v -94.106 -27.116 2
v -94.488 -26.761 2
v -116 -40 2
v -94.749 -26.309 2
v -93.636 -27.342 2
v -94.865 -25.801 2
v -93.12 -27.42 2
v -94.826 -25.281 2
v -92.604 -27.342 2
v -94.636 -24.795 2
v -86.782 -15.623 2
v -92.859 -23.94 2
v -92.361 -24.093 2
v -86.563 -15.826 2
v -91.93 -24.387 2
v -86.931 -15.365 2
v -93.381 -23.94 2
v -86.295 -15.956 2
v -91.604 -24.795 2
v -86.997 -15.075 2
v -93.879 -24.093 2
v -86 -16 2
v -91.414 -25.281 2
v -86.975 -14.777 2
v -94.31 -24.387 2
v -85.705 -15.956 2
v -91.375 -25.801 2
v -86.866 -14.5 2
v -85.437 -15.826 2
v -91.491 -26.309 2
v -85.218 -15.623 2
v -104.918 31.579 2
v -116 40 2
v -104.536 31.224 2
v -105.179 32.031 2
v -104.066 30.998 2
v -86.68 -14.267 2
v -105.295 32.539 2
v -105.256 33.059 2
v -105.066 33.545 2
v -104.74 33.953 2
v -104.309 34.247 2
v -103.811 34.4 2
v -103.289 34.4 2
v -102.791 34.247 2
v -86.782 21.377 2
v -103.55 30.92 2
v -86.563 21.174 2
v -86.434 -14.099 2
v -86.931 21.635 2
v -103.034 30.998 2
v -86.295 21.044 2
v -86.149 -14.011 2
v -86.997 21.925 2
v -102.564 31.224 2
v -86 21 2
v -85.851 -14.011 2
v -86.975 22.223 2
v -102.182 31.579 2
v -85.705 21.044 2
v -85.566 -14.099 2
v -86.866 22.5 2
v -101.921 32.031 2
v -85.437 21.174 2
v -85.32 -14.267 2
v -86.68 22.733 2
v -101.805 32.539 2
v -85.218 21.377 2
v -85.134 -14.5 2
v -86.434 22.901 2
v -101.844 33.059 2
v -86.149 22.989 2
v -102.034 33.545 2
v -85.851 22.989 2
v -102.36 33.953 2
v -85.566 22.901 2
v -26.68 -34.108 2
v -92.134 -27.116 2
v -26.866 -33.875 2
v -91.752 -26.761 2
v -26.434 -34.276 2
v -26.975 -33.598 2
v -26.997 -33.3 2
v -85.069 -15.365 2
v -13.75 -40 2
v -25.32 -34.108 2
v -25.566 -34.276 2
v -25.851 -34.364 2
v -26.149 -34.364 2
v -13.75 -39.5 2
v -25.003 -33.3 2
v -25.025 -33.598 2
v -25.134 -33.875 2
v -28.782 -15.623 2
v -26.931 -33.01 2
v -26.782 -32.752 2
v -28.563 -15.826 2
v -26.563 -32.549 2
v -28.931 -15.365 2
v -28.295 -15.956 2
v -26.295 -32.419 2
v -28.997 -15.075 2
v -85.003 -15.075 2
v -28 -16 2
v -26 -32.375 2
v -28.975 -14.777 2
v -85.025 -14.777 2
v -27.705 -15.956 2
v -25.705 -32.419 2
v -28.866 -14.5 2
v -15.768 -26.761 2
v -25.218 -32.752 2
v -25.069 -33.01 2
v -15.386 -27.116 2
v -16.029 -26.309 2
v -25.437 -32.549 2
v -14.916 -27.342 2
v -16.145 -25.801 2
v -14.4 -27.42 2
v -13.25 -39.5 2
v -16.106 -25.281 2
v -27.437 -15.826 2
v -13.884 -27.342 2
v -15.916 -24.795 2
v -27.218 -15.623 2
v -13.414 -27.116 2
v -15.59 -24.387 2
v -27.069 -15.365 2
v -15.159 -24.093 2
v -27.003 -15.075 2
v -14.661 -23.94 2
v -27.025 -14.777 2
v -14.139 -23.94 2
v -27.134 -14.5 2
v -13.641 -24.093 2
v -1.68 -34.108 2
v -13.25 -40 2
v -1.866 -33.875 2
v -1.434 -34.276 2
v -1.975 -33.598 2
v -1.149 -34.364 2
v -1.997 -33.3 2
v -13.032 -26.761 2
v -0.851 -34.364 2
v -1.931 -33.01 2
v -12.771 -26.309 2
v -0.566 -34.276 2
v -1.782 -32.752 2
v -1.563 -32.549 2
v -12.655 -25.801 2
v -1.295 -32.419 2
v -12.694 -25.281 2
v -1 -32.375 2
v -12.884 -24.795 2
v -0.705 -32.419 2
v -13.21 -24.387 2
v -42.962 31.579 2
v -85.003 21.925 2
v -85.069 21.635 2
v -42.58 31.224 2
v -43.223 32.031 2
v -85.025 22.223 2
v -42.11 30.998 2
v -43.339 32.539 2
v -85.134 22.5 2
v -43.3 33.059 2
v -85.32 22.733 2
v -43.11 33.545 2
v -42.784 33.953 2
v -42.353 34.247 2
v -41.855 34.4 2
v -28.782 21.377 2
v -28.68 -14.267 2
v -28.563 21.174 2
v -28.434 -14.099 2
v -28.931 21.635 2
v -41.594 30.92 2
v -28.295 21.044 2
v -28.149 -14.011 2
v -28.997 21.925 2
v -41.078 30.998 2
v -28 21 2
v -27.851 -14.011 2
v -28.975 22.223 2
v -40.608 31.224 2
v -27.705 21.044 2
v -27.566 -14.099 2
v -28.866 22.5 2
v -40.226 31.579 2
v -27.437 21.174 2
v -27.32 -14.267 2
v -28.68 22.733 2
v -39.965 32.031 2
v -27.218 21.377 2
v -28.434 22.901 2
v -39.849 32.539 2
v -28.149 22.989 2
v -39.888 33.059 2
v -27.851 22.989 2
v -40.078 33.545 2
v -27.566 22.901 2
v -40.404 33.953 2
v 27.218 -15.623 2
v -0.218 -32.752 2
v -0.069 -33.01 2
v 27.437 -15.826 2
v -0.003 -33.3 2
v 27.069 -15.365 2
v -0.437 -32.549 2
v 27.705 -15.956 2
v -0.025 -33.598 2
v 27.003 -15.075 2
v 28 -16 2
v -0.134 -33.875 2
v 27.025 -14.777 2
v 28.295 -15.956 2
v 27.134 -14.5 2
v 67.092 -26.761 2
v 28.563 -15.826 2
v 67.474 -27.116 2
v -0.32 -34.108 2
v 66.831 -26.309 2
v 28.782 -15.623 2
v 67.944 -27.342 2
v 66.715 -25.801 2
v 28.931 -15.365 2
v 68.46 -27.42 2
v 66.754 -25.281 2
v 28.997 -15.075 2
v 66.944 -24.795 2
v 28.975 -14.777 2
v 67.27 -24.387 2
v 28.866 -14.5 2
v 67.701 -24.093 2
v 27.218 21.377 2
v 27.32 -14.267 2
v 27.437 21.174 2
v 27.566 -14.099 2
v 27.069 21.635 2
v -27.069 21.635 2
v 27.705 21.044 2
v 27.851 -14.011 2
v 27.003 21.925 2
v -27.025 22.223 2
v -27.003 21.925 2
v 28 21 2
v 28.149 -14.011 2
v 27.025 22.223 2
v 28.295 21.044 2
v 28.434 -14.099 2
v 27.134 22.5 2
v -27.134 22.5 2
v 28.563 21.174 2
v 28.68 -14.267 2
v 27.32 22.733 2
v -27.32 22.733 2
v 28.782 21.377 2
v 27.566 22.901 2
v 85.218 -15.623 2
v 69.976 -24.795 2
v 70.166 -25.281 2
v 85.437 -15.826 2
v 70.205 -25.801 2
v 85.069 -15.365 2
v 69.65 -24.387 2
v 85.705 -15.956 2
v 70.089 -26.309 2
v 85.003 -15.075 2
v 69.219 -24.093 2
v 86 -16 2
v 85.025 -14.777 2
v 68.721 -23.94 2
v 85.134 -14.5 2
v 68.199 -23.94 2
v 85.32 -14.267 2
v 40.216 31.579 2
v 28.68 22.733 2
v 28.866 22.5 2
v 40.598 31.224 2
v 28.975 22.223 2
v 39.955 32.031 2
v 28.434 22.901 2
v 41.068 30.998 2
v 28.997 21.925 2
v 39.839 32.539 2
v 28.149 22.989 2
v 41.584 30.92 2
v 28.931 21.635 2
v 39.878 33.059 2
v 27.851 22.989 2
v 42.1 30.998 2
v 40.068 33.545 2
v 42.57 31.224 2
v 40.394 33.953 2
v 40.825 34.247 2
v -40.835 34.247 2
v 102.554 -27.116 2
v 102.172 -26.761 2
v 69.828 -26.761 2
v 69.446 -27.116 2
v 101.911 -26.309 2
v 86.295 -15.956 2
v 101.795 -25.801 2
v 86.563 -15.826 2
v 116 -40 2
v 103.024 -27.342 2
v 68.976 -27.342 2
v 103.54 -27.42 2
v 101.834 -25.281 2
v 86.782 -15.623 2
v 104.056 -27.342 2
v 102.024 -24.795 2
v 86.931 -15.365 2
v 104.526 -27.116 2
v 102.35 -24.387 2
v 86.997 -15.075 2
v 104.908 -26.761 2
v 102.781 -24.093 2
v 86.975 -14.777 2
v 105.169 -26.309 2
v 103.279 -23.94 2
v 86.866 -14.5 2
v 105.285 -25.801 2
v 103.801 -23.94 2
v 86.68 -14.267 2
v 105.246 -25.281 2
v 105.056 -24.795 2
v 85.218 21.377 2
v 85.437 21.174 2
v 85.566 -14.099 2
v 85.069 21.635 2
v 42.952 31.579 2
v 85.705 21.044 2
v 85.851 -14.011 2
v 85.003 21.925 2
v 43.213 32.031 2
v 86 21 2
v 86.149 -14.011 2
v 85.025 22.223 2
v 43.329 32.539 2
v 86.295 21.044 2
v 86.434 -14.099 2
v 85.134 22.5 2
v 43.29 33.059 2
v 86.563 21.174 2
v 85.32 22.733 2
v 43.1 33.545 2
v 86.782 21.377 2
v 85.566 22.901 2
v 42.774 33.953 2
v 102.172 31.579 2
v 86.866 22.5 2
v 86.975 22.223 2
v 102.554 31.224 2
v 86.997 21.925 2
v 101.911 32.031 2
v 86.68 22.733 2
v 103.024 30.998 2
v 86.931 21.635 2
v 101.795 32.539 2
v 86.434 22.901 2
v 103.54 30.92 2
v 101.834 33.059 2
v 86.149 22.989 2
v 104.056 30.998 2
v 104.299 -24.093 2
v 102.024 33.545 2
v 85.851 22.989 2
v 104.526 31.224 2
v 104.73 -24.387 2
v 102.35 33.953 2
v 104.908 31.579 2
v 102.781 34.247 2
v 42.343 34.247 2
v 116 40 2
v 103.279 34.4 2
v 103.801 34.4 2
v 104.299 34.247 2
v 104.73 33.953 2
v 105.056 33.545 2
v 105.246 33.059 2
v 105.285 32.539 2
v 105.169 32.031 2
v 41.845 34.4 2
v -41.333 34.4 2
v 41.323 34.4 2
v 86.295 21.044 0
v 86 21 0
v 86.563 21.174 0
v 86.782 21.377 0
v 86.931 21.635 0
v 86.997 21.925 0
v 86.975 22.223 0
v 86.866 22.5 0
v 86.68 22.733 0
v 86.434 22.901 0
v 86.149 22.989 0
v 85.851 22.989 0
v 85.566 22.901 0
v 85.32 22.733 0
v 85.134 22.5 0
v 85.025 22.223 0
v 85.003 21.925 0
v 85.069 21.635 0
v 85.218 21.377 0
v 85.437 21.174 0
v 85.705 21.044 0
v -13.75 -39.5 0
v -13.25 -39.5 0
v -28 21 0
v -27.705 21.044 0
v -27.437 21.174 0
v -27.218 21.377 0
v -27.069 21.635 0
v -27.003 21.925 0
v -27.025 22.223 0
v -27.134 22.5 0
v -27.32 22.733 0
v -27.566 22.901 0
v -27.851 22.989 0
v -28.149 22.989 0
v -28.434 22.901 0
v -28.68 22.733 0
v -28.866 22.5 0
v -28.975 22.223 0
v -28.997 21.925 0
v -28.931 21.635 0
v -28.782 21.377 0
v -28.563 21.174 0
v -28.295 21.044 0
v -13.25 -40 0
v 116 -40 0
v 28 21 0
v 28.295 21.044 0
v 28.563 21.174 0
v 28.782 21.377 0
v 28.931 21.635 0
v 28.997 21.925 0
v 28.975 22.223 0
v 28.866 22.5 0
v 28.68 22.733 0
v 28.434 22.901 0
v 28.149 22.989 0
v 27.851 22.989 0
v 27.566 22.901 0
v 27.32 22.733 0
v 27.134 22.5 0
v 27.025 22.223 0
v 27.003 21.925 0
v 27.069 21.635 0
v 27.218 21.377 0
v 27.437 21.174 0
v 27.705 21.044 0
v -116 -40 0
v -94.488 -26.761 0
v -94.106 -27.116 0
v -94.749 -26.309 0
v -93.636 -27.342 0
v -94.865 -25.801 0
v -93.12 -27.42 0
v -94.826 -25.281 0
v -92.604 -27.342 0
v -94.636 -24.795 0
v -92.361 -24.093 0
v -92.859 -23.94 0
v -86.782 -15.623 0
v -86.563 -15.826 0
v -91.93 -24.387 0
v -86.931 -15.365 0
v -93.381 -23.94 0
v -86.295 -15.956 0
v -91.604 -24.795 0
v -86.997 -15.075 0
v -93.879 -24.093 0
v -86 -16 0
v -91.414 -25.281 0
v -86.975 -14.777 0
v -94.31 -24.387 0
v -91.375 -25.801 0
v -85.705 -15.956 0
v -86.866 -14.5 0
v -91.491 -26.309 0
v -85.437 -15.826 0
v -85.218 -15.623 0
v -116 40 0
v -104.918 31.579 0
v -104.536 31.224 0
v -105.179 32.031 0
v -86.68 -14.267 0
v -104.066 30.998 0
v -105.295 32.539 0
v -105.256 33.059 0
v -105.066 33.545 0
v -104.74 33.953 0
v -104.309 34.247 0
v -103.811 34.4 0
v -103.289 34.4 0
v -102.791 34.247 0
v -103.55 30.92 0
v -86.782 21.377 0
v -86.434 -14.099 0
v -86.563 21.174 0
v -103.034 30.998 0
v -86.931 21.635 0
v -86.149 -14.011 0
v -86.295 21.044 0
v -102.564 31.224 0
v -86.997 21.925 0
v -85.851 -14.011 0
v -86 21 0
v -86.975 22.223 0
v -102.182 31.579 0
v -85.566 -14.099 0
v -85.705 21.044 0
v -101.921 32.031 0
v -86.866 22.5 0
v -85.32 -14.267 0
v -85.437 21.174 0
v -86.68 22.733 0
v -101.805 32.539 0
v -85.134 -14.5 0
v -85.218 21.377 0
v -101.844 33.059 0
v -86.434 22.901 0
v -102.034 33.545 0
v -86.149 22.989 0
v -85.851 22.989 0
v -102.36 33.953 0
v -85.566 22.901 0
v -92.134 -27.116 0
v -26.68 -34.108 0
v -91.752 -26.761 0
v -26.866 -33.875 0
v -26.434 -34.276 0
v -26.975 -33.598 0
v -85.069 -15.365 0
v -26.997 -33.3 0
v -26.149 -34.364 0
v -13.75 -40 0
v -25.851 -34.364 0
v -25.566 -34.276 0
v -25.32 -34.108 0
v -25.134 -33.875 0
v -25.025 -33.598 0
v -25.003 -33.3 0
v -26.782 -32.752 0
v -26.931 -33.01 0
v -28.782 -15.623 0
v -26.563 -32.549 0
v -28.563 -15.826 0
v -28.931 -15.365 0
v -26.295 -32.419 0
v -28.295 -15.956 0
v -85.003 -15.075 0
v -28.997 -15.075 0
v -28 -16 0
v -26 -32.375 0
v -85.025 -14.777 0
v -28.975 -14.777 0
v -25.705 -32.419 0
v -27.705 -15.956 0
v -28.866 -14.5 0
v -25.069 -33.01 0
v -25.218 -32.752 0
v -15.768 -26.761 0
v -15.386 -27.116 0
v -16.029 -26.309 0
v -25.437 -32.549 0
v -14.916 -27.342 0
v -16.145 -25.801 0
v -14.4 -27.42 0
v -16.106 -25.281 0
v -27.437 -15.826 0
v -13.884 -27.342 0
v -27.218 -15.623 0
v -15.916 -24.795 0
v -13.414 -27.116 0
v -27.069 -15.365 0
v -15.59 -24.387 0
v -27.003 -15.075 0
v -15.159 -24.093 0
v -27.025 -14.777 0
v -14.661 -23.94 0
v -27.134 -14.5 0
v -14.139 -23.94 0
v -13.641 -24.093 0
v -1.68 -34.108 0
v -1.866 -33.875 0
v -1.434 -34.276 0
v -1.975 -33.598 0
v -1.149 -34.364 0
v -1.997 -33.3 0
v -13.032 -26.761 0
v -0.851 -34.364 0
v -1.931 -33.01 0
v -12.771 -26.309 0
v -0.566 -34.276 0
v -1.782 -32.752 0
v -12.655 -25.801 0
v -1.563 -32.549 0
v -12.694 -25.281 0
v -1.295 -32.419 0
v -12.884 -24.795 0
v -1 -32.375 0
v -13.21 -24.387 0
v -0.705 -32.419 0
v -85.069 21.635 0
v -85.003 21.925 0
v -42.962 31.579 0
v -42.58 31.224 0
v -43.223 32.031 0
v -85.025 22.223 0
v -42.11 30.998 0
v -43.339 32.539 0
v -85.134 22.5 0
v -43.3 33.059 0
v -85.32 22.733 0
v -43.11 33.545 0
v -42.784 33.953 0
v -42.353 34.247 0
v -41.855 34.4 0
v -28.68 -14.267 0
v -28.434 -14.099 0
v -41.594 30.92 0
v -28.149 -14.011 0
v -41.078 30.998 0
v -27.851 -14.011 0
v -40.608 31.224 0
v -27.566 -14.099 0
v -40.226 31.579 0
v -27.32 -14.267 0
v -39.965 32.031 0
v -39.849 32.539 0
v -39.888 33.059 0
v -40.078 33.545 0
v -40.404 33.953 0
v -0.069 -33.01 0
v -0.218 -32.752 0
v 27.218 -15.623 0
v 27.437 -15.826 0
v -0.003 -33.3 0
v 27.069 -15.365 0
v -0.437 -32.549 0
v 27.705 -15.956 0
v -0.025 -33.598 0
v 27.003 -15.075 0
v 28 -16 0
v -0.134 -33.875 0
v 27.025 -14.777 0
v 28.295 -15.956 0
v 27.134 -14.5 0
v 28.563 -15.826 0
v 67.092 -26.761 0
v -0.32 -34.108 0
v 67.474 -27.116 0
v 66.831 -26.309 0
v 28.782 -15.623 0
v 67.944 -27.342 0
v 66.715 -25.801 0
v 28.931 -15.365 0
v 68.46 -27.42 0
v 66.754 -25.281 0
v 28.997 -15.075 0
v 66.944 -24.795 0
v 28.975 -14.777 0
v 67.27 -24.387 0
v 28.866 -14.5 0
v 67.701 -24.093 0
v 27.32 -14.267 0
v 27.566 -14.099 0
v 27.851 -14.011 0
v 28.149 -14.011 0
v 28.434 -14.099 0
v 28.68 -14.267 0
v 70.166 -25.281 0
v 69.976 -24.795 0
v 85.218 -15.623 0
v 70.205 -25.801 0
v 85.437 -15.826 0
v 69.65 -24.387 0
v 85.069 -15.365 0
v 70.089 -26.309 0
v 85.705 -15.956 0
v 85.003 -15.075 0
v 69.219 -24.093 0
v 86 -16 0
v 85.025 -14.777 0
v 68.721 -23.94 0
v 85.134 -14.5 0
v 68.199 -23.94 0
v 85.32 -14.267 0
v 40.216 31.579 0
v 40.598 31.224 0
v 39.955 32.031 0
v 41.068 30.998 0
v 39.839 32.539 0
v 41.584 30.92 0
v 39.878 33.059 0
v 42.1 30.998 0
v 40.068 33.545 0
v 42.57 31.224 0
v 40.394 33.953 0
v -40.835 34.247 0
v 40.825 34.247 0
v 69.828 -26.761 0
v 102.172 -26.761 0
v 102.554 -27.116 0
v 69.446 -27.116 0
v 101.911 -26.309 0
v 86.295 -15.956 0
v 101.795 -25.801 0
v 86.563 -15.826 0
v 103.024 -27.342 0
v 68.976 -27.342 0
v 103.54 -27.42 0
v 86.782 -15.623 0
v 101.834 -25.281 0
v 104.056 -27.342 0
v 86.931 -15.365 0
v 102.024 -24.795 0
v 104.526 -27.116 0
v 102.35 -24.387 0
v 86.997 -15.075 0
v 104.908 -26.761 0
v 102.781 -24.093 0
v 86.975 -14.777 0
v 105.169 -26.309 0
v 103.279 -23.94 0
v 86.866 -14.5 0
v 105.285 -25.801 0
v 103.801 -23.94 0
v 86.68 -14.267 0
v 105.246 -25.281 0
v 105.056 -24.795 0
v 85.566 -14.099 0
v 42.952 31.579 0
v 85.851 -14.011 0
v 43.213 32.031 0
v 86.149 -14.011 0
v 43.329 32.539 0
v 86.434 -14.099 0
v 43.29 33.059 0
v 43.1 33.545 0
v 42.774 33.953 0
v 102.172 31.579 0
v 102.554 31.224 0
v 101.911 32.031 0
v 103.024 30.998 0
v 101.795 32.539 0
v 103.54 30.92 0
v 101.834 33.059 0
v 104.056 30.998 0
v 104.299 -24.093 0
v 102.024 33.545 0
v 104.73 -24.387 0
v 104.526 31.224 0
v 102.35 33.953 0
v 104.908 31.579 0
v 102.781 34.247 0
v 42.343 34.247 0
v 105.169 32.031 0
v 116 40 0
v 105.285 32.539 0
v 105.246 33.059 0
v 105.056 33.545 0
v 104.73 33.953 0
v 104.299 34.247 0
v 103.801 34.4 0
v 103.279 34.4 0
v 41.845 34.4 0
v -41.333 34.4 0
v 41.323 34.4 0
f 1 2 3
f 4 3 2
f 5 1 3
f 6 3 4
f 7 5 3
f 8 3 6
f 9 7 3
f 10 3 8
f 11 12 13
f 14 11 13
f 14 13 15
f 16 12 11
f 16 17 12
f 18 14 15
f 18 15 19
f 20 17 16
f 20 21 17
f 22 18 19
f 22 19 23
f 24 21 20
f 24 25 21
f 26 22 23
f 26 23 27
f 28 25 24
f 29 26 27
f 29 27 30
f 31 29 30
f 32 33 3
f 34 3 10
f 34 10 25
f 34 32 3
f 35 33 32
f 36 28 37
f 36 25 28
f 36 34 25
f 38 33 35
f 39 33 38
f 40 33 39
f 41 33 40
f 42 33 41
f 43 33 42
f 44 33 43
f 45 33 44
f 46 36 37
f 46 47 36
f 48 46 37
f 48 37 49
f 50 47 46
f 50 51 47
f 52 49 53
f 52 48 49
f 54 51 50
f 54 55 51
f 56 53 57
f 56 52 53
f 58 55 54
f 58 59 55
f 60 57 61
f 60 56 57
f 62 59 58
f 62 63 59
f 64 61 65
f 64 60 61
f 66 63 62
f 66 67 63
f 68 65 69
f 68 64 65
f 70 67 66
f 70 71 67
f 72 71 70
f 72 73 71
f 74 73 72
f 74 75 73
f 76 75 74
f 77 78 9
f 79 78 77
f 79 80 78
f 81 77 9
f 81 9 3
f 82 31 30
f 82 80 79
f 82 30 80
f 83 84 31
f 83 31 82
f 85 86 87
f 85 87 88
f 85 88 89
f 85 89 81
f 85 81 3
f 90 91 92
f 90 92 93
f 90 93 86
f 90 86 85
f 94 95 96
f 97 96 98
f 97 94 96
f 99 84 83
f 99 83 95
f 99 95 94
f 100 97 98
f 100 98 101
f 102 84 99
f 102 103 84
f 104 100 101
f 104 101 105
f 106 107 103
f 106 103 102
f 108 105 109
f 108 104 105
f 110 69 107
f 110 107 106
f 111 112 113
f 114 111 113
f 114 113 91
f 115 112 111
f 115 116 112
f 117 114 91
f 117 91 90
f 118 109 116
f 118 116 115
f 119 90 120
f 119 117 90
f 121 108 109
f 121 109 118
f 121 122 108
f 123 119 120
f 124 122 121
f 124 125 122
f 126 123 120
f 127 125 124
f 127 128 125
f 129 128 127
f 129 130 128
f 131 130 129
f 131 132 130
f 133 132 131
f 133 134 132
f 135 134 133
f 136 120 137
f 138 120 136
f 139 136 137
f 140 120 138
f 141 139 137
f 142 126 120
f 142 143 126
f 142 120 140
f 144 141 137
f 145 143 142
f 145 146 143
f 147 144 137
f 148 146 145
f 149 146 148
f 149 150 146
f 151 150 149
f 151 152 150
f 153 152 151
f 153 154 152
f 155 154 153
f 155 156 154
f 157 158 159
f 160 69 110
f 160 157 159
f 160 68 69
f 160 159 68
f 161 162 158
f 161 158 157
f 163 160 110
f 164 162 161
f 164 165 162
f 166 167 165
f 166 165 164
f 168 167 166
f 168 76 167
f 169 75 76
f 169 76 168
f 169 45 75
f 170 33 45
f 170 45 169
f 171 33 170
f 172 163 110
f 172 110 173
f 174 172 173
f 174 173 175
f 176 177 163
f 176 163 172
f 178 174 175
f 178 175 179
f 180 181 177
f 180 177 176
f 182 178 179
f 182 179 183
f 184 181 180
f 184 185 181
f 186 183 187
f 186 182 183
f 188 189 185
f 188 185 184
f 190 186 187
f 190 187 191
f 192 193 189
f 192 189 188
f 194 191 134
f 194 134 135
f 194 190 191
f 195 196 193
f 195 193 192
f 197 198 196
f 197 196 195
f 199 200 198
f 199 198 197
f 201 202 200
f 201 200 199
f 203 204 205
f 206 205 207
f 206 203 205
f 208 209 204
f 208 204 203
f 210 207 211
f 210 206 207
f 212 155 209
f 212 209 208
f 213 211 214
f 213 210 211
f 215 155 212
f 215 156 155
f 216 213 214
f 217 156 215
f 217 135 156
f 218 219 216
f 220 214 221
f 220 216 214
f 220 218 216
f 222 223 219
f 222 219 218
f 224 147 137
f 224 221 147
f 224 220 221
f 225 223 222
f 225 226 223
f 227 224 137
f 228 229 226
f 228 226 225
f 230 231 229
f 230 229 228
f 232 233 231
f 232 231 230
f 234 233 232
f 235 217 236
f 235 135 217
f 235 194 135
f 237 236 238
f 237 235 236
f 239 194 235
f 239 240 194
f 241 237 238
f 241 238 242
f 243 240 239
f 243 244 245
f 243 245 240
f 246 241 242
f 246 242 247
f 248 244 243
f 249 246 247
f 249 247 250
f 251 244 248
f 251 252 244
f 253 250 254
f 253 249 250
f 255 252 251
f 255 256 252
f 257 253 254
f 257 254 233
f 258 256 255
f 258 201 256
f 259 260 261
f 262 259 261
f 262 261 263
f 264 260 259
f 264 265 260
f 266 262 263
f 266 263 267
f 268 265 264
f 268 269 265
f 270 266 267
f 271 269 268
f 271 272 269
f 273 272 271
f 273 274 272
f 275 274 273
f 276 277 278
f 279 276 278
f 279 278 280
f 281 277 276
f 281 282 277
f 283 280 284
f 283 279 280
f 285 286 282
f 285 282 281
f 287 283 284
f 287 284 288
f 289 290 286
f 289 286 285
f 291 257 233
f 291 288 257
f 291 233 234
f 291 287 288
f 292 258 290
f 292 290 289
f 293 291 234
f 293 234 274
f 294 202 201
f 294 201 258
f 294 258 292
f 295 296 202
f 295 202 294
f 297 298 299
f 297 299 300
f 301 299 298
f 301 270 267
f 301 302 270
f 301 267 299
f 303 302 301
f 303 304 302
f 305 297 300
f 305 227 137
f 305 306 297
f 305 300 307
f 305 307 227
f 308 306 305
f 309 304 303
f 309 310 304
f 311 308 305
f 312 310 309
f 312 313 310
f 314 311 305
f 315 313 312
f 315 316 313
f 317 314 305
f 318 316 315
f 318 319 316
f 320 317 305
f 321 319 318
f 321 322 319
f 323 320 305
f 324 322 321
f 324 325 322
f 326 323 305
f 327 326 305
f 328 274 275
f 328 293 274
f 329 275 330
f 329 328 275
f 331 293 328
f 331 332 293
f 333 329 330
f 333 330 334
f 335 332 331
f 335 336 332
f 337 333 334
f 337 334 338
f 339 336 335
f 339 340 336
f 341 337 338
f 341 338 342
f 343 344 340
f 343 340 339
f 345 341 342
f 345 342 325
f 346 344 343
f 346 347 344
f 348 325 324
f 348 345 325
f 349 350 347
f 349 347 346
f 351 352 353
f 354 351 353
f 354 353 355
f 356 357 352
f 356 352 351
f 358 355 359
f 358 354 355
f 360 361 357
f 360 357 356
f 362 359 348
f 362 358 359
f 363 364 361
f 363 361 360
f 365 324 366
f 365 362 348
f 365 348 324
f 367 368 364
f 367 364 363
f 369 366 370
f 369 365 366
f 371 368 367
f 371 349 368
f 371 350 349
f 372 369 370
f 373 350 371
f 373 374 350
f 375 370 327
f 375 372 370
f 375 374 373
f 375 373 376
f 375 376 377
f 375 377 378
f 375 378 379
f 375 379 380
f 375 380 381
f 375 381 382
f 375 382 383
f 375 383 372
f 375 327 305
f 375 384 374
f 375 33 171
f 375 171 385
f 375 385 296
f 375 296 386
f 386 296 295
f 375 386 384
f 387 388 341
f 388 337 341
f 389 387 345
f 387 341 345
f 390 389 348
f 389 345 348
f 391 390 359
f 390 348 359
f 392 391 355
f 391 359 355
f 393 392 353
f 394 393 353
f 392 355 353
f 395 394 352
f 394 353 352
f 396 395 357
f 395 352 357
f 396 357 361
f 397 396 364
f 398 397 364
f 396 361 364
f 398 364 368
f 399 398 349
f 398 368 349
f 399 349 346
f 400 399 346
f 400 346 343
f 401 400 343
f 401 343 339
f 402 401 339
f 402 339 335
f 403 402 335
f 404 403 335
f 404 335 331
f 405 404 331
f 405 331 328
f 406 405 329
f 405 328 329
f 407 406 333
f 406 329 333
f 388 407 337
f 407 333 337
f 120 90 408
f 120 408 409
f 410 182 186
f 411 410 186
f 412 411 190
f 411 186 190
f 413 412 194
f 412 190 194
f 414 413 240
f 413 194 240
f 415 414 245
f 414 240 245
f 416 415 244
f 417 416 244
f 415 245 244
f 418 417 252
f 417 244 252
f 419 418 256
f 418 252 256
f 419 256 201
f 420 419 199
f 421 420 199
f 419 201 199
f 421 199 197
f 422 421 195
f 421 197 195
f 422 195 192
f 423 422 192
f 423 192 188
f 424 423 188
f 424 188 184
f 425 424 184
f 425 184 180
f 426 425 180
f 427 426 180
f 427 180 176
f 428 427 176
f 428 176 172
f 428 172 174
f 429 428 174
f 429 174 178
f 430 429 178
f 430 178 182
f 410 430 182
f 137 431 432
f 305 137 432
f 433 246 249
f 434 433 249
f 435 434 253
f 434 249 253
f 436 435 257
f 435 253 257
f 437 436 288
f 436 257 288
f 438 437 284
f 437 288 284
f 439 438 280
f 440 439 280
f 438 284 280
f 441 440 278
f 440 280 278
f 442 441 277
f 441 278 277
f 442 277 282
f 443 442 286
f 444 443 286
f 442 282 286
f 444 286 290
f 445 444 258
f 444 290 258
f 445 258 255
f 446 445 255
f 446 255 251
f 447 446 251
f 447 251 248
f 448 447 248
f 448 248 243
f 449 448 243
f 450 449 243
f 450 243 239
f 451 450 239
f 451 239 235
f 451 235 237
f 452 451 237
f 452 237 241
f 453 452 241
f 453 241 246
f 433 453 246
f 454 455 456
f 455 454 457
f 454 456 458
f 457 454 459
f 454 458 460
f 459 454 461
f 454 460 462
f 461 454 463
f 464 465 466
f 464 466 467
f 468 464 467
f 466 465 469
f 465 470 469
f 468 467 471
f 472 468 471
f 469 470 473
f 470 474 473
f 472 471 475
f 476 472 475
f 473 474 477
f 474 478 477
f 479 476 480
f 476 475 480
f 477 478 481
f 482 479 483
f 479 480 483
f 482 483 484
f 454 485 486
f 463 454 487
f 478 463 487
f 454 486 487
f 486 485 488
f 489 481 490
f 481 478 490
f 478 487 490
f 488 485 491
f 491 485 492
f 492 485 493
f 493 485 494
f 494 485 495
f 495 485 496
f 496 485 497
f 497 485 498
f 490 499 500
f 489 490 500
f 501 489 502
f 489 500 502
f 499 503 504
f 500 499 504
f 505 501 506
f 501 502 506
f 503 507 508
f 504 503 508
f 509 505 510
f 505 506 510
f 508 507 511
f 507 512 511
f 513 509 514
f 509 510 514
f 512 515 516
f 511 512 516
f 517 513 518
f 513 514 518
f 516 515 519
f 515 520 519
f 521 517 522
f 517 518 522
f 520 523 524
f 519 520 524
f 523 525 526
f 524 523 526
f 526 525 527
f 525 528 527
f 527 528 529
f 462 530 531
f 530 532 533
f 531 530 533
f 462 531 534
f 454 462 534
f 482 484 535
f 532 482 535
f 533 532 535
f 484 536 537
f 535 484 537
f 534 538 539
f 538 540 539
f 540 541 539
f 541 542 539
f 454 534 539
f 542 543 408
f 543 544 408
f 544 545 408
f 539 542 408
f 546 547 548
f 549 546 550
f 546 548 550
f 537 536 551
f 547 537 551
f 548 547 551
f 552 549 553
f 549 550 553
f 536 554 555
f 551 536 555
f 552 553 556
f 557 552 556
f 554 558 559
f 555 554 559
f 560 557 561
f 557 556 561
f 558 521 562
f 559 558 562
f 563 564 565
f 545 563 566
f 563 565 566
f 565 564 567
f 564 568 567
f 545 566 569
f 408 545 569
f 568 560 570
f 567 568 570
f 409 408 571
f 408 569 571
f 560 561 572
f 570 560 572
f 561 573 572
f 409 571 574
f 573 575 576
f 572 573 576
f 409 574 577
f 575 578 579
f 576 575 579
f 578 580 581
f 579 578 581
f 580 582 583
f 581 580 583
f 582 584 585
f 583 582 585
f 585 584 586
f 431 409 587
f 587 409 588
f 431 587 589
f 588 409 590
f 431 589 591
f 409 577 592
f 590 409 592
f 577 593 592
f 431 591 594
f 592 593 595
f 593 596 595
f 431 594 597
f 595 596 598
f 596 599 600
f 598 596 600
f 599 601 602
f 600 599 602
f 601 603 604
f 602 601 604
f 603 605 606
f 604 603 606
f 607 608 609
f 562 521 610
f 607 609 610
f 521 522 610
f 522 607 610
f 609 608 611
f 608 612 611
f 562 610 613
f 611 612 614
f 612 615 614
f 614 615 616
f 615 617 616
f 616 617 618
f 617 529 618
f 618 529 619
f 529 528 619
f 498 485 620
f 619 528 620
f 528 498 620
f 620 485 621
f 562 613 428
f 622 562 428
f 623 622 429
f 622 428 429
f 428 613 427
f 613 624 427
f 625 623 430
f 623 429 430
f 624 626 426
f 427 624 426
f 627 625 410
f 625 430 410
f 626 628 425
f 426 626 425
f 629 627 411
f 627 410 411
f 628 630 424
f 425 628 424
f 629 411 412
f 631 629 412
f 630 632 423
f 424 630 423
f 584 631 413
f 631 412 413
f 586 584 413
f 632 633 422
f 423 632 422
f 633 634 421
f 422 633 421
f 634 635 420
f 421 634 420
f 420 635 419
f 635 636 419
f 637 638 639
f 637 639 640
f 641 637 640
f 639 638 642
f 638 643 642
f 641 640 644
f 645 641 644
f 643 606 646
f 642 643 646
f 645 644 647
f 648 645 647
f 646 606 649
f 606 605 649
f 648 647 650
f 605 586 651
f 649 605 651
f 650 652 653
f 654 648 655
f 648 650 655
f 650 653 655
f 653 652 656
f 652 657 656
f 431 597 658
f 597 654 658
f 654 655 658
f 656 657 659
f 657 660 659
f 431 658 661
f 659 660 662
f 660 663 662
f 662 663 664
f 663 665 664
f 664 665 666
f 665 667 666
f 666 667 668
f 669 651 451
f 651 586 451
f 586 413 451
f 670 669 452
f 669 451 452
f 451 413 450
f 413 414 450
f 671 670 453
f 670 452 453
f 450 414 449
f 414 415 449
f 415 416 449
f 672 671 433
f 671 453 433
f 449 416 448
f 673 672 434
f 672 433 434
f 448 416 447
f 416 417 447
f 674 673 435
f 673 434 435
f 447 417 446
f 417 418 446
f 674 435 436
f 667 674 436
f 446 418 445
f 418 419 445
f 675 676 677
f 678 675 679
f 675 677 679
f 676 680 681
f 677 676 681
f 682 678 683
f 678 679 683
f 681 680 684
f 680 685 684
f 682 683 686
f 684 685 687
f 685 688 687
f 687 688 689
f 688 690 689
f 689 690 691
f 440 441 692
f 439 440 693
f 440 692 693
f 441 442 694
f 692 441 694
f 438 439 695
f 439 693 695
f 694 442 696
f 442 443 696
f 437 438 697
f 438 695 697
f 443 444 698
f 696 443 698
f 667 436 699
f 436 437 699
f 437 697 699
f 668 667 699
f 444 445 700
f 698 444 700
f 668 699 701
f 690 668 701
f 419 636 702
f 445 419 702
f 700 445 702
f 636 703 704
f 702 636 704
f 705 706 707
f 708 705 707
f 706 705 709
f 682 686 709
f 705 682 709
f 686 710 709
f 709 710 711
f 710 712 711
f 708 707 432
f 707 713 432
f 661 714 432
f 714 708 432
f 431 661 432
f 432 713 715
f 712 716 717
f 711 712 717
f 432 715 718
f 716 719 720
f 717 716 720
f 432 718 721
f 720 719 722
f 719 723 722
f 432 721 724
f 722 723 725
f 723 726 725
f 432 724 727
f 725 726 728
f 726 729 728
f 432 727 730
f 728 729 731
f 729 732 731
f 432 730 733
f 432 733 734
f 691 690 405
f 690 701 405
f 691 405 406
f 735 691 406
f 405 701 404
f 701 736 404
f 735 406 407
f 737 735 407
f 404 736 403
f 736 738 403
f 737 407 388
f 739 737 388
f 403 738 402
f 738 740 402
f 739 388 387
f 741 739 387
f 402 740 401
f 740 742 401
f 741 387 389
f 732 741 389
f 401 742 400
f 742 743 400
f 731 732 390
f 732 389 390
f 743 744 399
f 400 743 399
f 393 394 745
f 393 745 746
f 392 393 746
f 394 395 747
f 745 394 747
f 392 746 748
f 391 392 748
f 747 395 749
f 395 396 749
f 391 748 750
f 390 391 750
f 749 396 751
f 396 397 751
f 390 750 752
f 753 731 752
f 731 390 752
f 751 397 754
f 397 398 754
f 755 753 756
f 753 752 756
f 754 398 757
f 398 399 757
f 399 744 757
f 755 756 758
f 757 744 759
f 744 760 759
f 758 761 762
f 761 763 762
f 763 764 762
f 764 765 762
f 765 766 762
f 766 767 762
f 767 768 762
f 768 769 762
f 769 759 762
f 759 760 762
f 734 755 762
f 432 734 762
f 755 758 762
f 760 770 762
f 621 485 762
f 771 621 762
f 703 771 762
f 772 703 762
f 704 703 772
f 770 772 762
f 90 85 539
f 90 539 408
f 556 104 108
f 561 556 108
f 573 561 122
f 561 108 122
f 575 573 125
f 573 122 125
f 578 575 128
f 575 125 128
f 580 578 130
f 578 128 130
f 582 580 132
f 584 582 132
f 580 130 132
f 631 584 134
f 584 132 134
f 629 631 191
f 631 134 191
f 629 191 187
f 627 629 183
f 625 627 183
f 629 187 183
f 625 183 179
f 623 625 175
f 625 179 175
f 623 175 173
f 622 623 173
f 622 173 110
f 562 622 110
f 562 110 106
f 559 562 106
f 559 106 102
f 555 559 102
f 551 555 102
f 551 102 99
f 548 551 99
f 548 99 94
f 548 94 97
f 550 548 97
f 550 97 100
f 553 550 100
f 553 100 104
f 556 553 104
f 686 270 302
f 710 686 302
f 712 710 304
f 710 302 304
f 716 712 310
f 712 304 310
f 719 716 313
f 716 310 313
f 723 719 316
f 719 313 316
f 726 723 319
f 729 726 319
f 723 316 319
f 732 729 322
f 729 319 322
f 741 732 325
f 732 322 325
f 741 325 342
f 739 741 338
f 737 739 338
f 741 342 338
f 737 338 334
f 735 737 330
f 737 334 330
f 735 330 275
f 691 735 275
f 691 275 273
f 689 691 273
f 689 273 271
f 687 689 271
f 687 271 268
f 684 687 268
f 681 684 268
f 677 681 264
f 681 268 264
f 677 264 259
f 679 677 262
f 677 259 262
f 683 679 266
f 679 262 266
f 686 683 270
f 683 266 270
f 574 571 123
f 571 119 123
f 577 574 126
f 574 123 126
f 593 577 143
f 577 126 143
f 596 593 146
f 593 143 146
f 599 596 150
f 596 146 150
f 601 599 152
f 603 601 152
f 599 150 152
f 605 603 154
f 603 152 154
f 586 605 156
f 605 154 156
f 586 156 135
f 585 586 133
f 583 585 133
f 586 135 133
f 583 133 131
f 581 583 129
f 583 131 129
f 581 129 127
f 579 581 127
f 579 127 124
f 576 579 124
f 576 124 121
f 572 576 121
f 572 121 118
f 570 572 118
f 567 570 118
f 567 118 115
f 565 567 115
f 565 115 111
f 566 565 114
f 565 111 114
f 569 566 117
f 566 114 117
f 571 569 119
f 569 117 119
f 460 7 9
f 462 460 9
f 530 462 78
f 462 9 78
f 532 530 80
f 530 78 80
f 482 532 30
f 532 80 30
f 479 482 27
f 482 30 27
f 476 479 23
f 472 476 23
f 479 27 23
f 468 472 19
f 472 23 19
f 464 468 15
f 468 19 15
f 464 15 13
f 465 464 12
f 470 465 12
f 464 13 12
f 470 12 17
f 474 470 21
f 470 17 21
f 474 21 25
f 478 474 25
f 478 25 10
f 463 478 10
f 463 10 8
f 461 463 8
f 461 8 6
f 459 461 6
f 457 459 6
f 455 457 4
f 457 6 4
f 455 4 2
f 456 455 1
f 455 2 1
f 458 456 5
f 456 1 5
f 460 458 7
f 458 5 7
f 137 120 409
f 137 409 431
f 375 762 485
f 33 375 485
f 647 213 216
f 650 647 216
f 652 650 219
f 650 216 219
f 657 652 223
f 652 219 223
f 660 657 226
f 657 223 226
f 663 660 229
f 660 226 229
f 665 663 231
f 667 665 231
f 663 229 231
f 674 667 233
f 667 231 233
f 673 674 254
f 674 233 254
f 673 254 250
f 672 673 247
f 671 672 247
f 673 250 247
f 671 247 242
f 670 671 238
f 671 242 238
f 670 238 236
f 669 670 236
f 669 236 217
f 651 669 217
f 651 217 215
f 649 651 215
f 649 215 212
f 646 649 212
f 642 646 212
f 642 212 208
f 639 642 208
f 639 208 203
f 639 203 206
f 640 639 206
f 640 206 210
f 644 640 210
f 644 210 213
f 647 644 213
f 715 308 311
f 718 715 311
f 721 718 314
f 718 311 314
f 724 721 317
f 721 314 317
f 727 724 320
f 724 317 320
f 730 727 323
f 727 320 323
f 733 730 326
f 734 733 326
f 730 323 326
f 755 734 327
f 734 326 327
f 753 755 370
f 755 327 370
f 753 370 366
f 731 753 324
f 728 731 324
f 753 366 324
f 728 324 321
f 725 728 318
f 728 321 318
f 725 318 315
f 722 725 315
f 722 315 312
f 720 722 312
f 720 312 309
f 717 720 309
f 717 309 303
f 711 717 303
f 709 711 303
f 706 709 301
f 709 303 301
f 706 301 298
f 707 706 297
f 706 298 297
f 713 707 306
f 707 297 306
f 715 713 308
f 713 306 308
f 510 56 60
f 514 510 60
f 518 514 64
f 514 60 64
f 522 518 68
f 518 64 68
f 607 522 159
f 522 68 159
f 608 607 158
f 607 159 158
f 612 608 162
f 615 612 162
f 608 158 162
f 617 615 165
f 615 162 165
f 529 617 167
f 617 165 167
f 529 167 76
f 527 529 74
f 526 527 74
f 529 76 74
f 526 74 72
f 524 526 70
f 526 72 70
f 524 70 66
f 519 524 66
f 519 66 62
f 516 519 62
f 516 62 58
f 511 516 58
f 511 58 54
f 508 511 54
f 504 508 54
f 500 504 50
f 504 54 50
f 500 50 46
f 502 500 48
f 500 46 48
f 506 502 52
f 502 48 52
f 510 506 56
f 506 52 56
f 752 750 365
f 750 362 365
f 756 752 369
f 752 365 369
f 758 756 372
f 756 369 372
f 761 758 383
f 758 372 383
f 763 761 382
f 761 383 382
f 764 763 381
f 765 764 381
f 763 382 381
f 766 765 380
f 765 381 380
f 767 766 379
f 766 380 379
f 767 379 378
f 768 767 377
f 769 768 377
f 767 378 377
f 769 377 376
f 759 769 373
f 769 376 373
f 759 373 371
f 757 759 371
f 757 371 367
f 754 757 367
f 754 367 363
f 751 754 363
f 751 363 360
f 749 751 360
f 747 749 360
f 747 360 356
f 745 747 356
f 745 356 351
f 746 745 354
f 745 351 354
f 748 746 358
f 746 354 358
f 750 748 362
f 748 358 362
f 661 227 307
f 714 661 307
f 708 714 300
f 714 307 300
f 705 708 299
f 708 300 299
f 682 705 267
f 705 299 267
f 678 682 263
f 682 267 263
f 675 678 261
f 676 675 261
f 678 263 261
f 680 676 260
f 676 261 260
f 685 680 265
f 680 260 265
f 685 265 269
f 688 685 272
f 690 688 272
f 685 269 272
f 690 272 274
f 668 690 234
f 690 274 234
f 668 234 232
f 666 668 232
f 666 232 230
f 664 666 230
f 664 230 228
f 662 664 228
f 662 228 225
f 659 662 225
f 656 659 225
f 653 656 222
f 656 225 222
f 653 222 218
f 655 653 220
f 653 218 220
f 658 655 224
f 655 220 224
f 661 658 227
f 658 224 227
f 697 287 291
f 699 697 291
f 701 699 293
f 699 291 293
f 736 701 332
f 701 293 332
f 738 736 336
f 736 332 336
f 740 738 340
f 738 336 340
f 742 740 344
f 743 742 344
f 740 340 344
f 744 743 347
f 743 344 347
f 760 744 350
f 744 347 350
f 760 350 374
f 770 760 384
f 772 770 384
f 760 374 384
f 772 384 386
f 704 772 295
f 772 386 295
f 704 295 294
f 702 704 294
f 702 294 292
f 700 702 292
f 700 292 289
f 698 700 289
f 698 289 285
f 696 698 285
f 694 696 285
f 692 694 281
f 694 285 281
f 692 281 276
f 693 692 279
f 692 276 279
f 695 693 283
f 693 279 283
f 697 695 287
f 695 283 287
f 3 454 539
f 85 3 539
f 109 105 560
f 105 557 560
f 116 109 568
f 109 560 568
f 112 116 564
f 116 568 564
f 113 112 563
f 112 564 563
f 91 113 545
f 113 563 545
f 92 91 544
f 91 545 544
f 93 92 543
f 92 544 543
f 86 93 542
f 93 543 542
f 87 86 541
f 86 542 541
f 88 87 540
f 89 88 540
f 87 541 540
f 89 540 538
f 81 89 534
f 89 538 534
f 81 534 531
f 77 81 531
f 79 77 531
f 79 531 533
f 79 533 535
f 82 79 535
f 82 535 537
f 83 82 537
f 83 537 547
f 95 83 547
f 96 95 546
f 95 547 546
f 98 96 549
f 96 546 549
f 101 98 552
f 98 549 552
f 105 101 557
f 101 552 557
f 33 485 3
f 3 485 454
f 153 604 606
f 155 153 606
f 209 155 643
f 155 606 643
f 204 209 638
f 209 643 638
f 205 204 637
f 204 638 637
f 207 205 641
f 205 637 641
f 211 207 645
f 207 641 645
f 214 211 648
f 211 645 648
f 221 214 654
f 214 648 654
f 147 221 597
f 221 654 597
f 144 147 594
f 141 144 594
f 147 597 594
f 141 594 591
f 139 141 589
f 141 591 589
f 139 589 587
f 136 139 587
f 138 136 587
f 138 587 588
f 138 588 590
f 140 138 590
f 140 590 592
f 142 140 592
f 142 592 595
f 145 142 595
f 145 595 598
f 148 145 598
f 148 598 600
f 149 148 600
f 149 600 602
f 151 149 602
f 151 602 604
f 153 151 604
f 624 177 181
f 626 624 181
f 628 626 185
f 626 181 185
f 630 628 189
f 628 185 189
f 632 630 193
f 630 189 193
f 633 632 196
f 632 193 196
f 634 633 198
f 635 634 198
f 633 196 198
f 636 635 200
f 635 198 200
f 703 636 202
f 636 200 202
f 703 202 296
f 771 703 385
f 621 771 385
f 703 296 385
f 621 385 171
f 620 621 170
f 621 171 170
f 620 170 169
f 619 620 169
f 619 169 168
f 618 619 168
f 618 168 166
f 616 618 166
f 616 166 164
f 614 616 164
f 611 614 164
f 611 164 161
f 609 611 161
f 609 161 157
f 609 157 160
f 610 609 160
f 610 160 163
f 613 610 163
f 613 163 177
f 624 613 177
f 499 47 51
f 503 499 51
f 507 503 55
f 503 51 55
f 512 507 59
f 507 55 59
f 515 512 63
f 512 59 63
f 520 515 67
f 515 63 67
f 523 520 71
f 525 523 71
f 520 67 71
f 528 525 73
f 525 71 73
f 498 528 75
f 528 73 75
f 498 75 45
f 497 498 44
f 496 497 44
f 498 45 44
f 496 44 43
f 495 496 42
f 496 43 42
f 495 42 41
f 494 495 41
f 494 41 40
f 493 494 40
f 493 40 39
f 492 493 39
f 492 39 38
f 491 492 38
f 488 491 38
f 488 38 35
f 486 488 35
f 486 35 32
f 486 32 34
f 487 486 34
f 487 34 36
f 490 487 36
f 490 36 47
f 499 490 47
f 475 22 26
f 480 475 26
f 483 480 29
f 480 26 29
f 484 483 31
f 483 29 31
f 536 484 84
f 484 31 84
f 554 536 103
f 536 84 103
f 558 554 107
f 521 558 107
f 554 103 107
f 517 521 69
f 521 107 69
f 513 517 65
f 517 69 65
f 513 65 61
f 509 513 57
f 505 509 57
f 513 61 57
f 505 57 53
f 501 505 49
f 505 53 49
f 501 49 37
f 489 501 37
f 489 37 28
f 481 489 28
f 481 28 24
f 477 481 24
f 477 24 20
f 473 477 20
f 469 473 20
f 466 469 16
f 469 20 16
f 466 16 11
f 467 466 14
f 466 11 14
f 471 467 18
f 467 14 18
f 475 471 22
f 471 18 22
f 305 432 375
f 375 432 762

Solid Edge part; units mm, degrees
sketch "Sketch1" plane through (0, 0, 0) normal (0, 0, 1) x (1, 0, 0)
  line L0 (-116, -40) -> (116, -40)
  line L1 (116, -40) -> (116, 40)
  line L2 (116, 40) -> (-116, 40)
  line L3 (-116, 40) -> (-116, -40)
  dimension "D1" = 80
  dimension "D2" = 232
extrude "Protrusion1" add sketch "Sketch1" along normal blind 2
hole "Hole1" at (-26, -33.375, 0) direction (0, 0, 1) diameter 2 end up to next
hole "Hole2" at (-1, -33.375, 0) direction (0, 0, 1) diameter 2 end up to next
hole "Hole3" at (-28, 22, 2) direction (0, 0, -1) diameter 2 end through all
hole "Hole4" at (28, 22, 2) direction (0, 0, -1) diameter 2 end through all
hole "Hole5" at (86, 22, 2) direction (0, 0, -1) diameter 2 end through all
hole "Hole6" at (86, -15, 2) direction (0, 0, -1) diameter 2 end through all
hole "Hole7" at (28, -15, 2) direction (0, 0, -1) diameter 2 end through all
hole "Hole8" at (-28, -15, 2) direction (0, 0, -1) diameter 2 end through all
hole "Hole9" at (-86, -15, 2) direction (0, 0, -1) diameter 2 end through all
hole "Hole10" at (-86, 22, 2) direction (0, 0, -1) diameter 2 end through all
sketch "Sketch2" plane through (0, 0, 2) normal (0, 0, 1) x (1, 0, 0)
  line L0 (-13.75, -40) -> (-13.25, -40)
  line L1 (-13.25, -39.5) -> (-13.25, -40)
  line L2 (-13.75, -39.5) -> (-13.25, -39.5)
  line L3 (-13.75, -40) -> (-13.75, -39.5)
  dimension "D1" = 0.5
extrude "Cutout1" cut sketch "Sketch2" against normal through all
hole "Hole11" at (-14.4, -25.67, 2) direction (0, 0, -1) diameter 3.5 end through all
hole "Hole12" at (-103.55, 32.67, 2) direction (0, 0, -1) diameter 3.5 end through all
hole "Hole13" at (103.54, -25.67, 2) direction (0, 0, -1) diameter 3.5 end through all
hole "Hole14" at (68.46, -25.67, 2) direction (0, 0, -1) diameter 3.5 end through all
hole "Hole15" at (103.54, 32.67, 2) direction (0, 0, -1) diameter 3.5 end through all
hole "Hole16" at (-41.594, 32.67, 2) direction (0, 0, -1) diameter 3.5 end through all
hole "Hole17" at (41.584, 32.67, 2) direction (0, 0, -1) diameter 3.5 end through all
hole "Hole18" at (-93.12, -25.67, 2) direction (0, 0, -1) diameter 3.5 end through all
